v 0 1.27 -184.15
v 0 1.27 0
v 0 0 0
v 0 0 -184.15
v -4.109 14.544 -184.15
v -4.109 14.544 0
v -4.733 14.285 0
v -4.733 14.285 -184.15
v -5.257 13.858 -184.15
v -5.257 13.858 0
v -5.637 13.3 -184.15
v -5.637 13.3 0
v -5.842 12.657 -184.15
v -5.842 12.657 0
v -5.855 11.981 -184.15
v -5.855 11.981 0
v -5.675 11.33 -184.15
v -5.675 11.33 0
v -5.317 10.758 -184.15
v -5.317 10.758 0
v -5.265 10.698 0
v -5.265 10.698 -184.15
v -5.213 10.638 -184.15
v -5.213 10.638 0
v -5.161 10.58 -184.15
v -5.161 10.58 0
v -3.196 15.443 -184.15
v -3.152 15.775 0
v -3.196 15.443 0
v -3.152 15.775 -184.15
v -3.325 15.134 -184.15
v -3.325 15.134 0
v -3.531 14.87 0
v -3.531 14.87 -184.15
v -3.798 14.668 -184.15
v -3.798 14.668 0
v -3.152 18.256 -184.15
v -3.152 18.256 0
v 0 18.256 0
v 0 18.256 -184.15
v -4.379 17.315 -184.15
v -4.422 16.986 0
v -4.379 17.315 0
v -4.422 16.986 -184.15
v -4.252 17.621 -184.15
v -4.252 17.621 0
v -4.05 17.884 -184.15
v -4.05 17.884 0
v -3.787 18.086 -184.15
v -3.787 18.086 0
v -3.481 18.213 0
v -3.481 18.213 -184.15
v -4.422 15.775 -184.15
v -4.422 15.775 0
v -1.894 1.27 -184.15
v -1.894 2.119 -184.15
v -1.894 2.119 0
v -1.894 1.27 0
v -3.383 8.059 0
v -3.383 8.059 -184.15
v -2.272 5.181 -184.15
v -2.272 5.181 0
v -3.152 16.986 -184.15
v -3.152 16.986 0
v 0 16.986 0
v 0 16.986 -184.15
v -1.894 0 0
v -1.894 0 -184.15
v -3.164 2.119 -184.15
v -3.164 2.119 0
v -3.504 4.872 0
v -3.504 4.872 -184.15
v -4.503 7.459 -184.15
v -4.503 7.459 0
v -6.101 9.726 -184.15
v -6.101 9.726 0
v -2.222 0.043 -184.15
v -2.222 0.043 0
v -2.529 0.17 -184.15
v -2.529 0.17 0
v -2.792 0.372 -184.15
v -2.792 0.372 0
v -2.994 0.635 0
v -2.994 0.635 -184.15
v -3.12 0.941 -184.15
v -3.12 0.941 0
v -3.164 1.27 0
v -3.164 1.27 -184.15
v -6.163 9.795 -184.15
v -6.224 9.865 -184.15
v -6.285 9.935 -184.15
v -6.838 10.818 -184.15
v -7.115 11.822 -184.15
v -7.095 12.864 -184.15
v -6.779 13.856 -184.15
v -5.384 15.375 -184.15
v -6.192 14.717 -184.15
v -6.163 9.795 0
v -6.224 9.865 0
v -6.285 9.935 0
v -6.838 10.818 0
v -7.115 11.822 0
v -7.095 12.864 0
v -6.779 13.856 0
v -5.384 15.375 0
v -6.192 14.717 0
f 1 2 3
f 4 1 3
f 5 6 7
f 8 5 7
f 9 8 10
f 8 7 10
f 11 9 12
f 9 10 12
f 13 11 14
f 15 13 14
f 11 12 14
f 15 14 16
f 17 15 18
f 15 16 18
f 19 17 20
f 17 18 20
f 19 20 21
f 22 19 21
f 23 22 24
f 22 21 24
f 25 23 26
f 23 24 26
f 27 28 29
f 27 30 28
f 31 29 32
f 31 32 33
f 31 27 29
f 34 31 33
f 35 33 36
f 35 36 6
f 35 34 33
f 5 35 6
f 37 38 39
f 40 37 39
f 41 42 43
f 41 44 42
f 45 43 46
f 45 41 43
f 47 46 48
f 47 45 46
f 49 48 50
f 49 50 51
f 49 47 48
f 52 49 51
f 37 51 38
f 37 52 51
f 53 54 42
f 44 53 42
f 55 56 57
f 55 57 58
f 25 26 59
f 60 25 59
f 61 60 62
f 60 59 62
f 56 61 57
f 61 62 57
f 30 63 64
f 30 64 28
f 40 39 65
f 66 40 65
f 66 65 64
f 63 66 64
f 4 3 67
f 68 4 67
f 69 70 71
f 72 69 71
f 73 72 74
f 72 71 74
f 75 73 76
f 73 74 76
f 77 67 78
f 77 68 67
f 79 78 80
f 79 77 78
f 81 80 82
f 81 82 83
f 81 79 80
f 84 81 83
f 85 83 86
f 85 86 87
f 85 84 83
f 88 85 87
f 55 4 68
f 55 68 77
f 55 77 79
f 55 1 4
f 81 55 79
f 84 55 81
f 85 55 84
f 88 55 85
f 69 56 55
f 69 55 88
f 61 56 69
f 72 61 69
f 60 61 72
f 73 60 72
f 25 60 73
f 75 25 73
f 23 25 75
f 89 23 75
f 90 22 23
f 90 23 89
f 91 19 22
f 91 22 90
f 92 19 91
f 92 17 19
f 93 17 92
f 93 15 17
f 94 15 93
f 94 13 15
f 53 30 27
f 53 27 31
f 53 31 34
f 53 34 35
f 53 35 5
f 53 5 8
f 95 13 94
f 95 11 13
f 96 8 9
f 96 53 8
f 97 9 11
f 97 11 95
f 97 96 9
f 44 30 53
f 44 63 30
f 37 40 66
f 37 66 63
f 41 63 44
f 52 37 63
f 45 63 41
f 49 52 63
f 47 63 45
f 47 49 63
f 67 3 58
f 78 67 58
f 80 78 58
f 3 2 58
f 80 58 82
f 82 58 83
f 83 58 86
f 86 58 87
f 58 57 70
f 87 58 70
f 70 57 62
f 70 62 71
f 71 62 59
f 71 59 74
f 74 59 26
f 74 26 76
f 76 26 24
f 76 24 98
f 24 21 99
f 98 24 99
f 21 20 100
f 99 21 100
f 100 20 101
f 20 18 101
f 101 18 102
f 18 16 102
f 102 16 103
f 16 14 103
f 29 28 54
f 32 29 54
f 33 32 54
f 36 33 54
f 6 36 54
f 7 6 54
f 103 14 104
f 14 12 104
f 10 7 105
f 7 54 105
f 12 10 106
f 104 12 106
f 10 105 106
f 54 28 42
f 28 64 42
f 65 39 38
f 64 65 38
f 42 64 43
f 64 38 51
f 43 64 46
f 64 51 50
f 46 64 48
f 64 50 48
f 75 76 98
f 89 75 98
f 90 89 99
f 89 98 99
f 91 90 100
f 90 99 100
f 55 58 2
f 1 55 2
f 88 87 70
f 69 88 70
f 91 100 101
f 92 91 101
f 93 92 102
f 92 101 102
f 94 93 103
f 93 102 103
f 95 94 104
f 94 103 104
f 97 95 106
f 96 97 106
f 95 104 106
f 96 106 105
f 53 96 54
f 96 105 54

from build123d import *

# Parameters (mm, degrees)
EXTRUDE_THIN1_DEPTH = 184.15
FILLET1_R           = 1.27


with BuildPart() as part:
    # Sketch1 → Extrude-Thin1 (new body)
    with BuildSketch(Plane.XY):
        with BuildLine():
            Line((0, 0), (-3.163716198, 0))
            Line((-3.163716198, 0), (-3.163716198, 2.119463738))
            ThreePointArc((-3.163716198, 2.119463738), (-3.923538192, 6.196525566), (-6.100987039, 9.72618265))
            ThreePointArc((-6.100987039, 9.72618265), (-6.193680003, 9.830012941), (-6.284653862, 9.935352736))
            ThreePointArc((-6.284653862, 9.935352736), (-6.972873445, 13.371716383), (-4.421808228, 15.774695279))
            Line((-4.421808228, 15.774695279), (-4.421808228, 18.25625))
            Line((-4.421808228, 18.25625), (0, 18.25625))
            Line((0, 18.25625), (0, 16.98625))
            Line((0, 16.98625), (-3.151808228, 16.98625))
            Line((-3.151808228, 16.98625), (-3.151808228, 14.585167393))
            ThreePointArc((-3.151808228, 14.585167393), (-5.570244387, 13.426967033), (-5.316692669, 10.757515207))
            ThreePointArc((-5.316692669, 10.757515207), (-5.239362872, 10.667974045), (-5.160571796, 10.579715995))
            ThreePointArc((-5.160571796, 10.579715995), (-2.738796161, 6.654003785), (-1.893716198, 2.119463738))
            Line((-1.893716198, 2.119463738), (-1.893716198, 1.27))
            Line((-1.893716198, 1.27), (0, 1.27))
            Line((0, 1.27), (0, 0))
        make_face()
    extrude(amount=-EXTRUDE_THIN1_DEPTH)

    # Fillet1
    fillet1_edges = [part.edges().sort_by_distance(p)[0] for p in [
        (-3.163716198, 0, -92.075),
        (-4.421808228, 18.25625, -92.075),
        (-3.151808228, 14.585167393, -92.075),
    ]]
    fillet(fillet1_edges, radius=FILLET1_R)


solid = part.part
